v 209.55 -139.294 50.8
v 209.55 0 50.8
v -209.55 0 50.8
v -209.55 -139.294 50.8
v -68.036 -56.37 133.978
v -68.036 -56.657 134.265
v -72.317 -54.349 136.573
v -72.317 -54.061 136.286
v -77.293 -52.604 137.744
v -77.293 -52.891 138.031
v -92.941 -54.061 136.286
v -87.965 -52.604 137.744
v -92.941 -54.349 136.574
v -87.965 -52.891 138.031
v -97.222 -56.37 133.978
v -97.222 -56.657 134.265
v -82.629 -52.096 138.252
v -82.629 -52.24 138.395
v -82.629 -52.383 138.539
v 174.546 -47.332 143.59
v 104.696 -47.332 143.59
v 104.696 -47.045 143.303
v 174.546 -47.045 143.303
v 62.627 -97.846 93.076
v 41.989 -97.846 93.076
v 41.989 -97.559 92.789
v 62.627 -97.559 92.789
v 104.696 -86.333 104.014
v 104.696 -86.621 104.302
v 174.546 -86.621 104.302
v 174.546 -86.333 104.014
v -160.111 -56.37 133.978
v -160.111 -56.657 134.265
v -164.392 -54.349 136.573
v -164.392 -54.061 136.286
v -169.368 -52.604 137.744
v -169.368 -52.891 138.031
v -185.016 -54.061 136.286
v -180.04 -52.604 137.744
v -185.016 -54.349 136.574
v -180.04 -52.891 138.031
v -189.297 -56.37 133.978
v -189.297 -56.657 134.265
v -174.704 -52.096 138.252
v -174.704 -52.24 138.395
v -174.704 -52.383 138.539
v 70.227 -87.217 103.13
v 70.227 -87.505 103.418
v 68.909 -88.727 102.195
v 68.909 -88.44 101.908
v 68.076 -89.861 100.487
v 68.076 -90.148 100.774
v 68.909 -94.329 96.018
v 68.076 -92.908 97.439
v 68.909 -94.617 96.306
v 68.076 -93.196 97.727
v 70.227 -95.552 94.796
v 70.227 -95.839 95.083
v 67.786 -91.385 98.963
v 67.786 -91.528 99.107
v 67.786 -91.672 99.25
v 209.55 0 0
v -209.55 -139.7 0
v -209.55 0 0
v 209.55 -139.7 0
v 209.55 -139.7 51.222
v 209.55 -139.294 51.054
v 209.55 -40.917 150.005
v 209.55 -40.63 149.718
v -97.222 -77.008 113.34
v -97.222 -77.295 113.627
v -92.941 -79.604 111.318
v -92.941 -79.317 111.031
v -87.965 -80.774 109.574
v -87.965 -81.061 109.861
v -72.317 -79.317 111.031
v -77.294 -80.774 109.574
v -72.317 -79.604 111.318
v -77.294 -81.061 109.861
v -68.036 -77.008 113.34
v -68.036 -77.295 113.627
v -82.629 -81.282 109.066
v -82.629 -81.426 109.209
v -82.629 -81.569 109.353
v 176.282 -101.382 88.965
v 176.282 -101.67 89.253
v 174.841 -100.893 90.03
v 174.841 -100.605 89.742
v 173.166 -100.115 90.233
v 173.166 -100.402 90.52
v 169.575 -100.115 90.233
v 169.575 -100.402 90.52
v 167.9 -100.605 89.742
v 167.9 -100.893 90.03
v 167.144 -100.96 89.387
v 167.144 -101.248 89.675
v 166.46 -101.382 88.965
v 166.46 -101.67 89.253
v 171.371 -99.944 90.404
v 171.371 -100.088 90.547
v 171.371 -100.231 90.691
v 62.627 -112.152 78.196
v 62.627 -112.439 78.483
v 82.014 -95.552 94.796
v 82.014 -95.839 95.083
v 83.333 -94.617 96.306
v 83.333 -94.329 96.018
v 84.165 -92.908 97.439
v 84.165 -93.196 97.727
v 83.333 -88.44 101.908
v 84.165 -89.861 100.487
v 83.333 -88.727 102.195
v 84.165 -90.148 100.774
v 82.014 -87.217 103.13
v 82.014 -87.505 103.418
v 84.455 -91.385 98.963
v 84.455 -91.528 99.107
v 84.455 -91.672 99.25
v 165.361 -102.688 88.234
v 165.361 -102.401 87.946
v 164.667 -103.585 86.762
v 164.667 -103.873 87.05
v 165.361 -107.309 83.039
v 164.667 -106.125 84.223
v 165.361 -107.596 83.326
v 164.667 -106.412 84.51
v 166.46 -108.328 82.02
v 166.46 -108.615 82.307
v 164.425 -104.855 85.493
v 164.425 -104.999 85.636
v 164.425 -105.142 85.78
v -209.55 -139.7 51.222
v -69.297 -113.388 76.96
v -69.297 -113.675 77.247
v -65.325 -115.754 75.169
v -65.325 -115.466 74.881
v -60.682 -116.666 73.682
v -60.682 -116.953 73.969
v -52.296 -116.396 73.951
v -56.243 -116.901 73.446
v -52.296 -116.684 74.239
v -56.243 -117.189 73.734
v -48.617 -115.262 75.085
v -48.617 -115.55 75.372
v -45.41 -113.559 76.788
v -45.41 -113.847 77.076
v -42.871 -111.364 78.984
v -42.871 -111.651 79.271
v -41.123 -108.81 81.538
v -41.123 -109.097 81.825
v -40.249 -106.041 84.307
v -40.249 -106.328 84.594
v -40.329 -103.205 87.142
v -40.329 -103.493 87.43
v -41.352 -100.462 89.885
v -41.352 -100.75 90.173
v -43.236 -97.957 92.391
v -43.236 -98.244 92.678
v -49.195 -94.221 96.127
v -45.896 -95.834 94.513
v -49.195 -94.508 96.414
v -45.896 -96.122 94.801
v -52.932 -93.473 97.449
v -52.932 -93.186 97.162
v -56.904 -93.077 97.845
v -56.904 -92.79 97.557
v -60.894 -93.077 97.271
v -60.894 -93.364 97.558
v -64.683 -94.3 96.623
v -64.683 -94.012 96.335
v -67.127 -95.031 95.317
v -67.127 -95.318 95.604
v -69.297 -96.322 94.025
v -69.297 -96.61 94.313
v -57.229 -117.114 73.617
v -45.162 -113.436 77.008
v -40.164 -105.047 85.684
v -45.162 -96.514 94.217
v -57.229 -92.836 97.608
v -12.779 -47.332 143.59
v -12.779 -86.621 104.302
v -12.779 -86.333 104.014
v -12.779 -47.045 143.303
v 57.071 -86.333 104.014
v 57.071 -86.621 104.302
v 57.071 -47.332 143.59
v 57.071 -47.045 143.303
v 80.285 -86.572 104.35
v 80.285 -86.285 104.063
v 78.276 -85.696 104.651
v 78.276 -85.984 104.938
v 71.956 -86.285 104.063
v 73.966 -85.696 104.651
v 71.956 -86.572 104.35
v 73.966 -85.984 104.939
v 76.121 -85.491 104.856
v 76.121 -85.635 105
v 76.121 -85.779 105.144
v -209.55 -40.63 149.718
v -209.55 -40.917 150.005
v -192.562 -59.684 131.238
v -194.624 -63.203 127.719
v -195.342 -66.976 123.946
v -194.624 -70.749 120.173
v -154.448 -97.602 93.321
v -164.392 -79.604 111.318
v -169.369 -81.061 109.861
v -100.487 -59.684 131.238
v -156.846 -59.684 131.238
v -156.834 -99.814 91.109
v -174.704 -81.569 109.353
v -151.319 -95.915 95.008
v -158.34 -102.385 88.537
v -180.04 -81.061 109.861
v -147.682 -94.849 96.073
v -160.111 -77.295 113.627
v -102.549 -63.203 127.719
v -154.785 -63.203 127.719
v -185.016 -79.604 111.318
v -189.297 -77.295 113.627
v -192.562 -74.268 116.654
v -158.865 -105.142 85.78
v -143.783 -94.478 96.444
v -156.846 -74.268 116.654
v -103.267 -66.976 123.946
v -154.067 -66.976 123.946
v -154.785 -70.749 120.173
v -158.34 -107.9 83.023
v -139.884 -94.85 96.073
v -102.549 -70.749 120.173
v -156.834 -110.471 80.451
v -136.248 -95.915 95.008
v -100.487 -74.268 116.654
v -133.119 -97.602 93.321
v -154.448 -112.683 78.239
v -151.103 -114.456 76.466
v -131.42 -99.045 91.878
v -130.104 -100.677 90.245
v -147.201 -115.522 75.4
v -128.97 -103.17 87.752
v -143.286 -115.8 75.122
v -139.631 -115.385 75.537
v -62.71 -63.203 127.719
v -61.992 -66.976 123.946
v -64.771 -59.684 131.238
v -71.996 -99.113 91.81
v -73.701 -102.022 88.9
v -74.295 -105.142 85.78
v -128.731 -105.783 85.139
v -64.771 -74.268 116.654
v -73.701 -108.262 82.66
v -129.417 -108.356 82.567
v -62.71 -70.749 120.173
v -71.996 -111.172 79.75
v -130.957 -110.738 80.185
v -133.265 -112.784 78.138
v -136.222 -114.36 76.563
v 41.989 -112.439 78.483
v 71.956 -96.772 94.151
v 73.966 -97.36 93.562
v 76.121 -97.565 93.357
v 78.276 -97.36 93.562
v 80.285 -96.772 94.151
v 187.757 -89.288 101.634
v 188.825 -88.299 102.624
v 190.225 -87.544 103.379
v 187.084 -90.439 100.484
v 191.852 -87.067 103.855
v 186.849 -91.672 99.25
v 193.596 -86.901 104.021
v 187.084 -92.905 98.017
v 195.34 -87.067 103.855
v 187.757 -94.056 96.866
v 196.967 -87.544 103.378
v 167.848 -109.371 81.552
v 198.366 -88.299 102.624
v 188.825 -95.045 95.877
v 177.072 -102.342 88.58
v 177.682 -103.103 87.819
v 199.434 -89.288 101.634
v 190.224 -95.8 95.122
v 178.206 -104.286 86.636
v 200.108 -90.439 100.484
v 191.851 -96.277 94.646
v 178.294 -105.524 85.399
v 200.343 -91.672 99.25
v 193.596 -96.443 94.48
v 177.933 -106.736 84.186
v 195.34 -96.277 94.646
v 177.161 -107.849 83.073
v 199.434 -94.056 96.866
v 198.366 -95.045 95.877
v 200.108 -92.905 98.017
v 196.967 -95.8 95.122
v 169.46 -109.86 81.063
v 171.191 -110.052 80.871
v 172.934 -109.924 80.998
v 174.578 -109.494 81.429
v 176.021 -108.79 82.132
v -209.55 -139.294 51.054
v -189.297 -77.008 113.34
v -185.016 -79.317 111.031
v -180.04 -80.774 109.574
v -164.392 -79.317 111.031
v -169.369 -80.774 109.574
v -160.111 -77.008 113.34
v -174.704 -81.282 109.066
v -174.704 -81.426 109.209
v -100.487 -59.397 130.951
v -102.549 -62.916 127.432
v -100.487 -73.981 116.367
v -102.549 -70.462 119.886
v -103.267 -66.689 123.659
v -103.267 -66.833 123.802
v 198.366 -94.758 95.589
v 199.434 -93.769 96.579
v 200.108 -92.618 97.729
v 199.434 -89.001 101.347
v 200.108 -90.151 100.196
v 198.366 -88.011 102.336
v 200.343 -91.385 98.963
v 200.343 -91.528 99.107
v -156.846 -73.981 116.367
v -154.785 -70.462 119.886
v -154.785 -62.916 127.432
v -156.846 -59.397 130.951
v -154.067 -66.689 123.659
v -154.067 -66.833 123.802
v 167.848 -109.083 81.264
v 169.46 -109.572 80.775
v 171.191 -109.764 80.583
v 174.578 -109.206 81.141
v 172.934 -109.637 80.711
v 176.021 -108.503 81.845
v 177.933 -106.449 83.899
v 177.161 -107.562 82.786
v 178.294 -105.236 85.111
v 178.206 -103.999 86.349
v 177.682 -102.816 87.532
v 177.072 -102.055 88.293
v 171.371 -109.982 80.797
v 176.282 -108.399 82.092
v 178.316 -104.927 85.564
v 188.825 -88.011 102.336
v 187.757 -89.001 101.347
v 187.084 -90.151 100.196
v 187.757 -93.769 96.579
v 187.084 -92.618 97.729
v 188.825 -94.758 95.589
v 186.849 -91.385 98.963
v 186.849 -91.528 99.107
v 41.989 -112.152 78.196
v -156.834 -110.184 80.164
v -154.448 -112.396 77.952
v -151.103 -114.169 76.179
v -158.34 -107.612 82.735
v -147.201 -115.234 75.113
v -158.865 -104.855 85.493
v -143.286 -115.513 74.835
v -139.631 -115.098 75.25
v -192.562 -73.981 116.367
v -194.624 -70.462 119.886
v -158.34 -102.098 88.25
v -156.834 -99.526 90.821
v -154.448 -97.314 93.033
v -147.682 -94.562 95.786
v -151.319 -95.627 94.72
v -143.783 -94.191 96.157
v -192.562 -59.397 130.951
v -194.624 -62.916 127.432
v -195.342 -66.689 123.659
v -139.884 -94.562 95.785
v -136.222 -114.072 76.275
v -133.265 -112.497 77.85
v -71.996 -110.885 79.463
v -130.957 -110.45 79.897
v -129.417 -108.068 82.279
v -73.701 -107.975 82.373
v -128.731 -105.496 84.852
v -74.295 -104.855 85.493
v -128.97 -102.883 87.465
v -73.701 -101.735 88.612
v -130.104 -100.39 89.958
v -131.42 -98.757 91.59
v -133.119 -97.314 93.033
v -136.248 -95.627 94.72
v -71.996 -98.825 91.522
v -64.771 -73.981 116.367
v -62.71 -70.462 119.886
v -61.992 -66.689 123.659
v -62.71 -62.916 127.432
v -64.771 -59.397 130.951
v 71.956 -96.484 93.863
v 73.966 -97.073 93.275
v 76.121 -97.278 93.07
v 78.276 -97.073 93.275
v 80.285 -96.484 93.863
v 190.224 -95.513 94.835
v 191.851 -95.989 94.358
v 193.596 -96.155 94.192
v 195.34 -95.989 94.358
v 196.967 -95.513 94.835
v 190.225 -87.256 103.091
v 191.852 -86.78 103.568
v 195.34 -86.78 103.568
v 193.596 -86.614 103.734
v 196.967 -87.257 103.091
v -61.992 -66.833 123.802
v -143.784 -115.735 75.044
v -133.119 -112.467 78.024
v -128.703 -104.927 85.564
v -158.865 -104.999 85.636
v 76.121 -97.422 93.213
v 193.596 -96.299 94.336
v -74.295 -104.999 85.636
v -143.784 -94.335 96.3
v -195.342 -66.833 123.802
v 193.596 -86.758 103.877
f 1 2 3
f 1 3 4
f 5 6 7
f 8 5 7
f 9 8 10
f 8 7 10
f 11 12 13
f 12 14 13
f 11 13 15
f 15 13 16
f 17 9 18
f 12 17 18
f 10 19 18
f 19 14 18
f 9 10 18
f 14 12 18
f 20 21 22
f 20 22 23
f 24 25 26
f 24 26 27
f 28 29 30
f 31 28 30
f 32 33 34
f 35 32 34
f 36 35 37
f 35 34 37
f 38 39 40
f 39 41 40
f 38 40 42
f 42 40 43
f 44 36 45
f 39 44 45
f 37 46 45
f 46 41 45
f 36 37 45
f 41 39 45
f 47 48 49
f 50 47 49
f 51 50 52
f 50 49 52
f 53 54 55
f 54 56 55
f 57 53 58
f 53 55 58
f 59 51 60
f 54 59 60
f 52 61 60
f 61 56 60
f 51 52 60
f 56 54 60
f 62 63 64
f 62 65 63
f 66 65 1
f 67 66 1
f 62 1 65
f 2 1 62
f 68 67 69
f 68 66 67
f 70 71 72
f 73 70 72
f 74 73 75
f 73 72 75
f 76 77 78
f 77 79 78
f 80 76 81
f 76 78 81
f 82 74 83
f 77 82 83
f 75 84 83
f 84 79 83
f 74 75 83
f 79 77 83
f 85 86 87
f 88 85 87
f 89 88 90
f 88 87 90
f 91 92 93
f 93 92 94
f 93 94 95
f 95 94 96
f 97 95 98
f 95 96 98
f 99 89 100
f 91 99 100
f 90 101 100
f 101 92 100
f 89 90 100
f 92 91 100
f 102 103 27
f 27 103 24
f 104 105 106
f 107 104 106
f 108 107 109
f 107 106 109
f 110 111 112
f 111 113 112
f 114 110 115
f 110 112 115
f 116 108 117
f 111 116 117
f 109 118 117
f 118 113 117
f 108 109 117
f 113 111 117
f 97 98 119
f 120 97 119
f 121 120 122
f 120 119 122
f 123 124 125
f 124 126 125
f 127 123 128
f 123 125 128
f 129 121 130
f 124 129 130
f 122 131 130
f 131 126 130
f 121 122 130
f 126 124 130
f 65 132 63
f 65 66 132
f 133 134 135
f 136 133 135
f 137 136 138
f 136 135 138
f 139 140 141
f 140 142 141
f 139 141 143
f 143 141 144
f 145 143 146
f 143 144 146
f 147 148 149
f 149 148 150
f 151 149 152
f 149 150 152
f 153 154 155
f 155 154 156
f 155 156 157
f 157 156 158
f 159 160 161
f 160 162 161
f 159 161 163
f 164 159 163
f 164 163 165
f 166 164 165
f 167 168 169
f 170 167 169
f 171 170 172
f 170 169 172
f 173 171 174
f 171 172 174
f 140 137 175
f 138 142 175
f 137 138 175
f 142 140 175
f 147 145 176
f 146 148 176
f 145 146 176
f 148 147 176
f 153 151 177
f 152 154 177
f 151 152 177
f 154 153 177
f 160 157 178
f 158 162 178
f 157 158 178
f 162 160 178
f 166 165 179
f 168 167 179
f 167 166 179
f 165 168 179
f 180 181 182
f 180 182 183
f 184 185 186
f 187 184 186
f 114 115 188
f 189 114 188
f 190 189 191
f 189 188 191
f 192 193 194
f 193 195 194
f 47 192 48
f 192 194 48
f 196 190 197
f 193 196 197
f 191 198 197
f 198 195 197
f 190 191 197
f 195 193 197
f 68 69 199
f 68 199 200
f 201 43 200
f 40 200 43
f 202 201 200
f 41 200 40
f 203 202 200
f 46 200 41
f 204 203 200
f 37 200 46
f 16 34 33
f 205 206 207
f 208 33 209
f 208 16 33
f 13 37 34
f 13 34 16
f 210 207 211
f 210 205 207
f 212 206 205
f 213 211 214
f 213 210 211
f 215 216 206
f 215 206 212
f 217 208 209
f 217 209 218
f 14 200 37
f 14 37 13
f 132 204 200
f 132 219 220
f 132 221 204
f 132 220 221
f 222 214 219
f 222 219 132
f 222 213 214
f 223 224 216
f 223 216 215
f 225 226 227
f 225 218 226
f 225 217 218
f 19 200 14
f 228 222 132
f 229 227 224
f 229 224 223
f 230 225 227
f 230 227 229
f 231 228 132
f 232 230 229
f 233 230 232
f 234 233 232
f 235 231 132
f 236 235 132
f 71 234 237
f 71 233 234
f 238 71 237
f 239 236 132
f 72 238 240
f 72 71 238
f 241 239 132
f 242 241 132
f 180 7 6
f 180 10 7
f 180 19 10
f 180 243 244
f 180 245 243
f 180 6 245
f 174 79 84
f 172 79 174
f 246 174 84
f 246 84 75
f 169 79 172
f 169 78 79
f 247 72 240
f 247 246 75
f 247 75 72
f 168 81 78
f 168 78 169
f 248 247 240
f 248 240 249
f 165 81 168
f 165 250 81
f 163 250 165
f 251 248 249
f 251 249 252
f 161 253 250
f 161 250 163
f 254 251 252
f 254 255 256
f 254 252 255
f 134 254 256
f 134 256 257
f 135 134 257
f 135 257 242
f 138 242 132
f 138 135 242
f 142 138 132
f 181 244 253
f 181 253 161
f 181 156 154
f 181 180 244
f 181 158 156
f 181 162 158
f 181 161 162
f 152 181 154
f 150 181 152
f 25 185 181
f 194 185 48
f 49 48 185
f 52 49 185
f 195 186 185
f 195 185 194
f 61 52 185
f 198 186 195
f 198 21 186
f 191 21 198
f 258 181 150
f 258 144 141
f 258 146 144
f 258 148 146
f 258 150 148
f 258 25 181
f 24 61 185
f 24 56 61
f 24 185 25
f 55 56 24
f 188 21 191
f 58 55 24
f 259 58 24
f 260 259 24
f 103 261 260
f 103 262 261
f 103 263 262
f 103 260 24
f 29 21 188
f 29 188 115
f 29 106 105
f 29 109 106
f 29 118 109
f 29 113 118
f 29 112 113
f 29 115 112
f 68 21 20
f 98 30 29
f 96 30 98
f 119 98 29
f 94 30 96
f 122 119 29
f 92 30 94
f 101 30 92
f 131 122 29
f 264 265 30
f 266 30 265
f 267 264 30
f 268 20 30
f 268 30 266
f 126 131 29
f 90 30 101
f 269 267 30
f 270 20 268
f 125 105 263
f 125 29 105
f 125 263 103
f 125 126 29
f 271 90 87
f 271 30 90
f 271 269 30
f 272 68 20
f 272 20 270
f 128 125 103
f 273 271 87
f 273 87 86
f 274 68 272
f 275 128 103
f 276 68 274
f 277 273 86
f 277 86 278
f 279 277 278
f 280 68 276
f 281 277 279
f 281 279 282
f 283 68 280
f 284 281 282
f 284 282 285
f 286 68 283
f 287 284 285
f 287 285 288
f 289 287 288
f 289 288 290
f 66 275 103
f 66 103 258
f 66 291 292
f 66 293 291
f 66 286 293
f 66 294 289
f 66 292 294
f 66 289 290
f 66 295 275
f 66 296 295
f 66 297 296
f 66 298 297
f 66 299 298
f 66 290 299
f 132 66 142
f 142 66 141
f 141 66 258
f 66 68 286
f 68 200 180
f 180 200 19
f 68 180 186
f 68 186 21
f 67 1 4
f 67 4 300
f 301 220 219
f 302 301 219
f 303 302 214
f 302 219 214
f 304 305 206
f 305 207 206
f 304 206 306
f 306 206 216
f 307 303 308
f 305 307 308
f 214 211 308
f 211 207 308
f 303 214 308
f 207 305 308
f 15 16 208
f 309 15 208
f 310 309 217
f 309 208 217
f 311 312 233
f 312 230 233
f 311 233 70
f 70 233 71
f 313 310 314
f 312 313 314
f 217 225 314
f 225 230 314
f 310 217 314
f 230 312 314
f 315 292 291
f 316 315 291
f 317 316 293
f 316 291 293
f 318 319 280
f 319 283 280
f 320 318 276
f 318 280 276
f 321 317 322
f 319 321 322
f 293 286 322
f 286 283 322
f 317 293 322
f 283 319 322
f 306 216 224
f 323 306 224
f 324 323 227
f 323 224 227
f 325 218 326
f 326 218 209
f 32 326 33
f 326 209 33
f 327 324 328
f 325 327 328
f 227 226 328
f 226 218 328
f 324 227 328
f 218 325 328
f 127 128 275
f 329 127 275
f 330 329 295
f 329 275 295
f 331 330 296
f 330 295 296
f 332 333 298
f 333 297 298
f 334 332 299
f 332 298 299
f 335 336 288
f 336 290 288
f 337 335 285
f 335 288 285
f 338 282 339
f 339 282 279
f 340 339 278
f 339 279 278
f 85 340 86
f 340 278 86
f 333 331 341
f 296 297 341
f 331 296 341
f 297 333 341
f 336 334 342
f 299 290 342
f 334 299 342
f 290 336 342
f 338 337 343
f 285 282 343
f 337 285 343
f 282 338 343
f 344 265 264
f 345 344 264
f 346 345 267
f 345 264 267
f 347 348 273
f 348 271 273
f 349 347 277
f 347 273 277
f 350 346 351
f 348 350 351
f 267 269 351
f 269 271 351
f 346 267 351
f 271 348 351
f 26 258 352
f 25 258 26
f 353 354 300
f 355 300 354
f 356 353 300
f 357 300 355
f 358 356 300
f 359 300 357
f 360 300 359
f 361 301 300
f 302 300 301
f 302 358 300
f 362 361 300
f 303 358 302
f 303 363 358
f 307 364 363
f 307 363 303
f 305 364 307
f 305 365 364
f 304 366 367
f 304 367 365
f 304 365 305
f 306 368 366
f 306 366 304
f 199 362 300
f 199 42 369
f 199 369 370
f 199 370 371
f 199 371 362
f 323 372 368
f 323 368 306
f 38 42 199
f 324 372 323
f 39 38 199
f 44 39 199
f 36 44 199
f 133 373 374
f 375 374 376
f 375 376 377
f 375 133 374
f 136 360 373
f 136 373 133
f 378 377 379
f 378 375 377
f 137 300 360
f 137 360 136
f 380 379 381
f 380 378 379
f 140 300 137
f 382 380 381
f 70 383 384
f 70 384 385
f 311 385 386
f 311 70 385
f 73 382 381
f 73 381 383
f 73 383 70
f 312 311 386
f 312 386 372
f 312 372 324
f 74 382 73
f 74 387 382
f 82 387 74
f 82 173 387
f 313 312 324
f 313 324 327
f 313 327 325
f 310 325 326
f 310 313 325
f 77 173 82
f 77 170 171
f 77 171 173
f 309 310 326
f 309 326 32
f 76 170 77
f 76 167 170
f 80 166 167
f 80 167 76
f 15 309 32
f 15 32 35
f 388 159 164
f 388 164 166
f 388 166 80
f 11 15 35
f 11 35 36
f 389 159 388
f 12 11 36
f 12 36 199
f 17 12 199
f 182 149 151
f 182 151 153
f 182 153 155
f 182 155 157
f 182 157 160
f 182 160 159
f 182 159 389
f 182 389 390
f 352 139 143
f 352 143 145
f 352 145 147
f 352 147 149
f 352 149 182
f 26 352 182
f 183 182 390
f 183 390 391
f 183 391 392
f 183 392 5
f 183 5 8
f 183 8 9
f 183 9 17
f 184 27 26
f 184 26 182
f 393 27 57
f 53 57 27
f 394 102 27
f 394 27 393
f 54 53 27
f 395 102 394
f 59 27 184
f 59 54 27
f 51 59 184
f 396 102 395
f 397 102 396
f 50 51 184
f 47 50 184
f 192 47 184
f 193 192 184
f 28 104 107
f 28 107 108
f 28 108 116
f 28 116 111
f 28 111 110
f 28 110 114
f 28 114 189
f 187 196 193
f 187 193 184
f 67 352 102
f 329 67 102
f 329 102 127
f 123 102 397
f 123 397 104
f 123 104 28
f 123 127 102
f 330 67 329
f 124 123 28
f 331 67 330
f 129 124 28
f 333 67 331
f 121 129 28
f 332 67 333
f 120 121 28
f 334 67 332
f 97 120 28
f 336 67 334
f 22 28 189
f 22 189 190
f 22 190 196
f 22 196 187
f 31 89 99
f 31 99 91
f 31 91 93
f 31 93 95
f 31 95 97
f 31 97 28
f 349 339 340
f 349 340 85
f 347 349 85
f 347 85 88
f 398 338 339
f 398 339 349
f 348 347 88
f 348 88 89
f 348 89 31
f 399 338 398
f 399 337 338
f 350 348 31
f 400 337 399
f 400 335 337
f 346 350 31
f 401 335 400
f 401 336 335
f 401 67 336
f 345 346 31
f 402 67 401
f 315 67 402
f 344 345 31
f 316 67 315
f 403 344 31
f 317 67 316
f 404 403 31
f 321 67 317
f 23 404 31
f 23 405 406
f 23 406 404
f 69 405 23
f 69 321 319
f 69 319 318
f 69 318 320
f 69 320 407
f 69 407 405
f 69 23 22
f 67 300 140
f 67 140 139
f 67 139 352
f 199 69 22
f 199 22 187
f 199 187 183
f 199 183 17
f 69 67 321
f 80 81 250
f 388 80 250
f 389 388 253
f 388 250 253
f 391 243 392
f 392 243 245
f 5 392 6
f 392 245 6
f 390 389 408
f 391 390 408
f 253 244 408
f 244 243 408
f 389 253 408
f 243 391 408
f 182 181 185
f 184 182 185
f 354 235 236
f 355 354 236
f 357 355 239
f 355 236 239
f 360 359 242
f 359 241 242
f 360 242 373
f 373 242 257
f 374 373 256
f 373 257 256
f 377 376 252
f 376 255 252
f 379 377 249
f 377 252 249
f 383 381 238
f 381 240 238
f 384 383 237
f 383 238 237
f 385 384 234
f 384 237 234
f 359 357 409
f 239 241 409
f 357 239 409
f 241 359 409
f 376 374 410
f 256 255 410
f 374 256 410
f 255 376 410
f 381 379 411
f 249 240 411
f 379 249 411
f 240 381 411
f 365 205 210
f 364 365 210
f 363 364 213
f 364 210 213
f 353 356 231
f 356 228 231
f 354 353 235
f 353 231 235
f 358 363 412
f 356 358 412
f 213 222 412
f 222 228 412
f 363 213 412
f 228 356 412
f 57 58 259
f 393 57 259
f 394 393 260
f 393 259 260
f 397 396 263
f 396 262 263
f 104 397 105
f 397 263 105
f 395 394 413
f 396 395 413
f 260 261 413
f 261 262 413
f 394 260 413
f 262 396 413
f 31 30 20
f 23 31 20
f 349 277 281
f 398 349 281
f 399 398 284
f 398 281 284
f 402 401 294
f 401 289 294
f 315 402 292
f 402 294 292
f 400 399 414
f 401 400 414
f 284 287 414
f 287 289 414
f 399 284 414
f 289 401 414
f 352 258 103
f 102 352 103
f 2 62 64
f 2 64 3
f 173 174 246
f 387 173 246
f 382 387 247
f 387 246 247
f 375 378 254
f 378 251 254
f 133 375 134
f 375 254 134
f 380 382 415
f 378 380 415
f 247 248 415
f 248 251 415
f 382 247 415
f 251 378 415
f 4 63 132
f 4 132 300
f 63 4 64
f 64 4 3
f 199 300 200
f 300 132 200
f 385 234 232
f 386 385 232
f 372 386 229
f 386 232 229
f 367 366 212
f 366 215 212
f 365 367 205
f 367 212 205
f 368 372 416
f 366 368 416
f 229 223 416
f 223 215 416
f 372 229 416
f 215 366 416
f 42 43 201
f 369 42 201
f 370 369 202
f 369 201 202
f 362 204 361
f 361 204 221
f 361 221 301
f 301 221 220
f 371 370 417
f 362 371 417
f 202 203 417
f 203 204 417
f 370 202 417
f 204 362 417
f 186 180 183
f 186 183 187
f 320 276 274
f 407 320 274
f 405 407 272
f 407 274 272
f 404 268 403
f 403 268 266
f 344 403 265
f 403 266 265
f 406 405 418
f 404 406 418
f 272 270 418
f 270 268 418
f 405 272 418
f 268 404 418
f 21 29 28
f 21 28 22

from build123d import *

# Parameters (mm, degrees)
F1_DEPTH = 209.55
F2_W     = 20.6375
F2_H     = 20.6375
F2_W_2   = 69.85
F2_H_2   = 55.5625
F3_DEPTH = 0.4064


# Not quite as in the source:
# - the dataset's text gives a spline's control points without its knots; the knots are read off the source's solid


with BuildPart() as f1:
    # F0 (on Right) → F1 (new body, symmetric)
    with BuildSketch(Plane.YZ):
        Polygon((-139.7, 0), (0, 0), (0, 50.8), (-139.2936, 50.8), (-139.2936, 51.054), (-40.6298144724, 149.7177855276), (-40.9171826682, 150.0051537235), (-139.7, 51.2223363917), align=None)
    extrude(amount=F1_DEPTH, both=True)

    # F2 (on face) → F3 (cut, through all)
    with BuildSketch(Plane(origin=(0, -95.4611681959, 95.4611681959), x_dir=(1, 0, 0), z_dir=(0, -0.7071067812, 0.7071067812))):
        with Locations((52.3081513166, -13.6913588034)):
            Rectangle(F2_W, F2_H)
        with Locations((139.6206513166, 40.2836411966)):
            Rectangle(F2_W_2, F2_H_2)
        with Locations((22.1456513166, 40.2836411966)):
            Rectangle(F2_W_2, F2_H_2)
        with BuildLine():
            add(Edge.make_bspline(
                [(-69.2965076834, -25.7584924034), (-66.1370016834, -28.9176682034), (-61.6969800834, -30.7569838034), (-57.2293486834, -30.7569838034), (-52.7614378834, -30.7569838034), (-48.3210606834, -28.9176682034), (-45.1618848834, -25.7584924034), (-42.0027344834, -22.5993420034), (-40.1637236834, -18.1593204034), (-40.1637236834, -13.6913588034), (-40.1637236834, -9.2234226034), (-42.0027344834, -4.7833502034), (-45.1618848834, -1.6242252034), (-48.3210606834, 1.5349251966), (-52.7614378834, 3.3742661966), (-57.2293486834, 3.3742661966)],
                knots=[3, 3, 3, 3, 4, 4, 4, 5, 5, 5, 6, 6, 6, 7, 7, 7, 8, 8, 8, 8], degree=3))
            add(Edge.make_bspline(
                [(-57.2293486834, 3.3742661966), (-61.6969800834, 3.3742661966), (-66.1370016834, 1.5349251966), (-69.2965076834, -1.6242252034)],
                knots=[0, 0, 0, 0, 1, 1, 1, 1], degree=3))
            add(Edge.make_bspline(
                [(-69.2965076834, -1.6242252034), (-72.4556326834, -4.7833502034), (-74.2949736834, -9.2234226034), (-74.2949736834, -13.6913588034), (-74.2949736834, -18.1593204034), (-72.4556326834, -22.5993420034), (-69.2965076834, -25.7584924034)],
                knots=[1, 1, 1, 1, 2, 2, 2, 3, 3, 3, 3], degree=3))
        make_face()
        with BuildLine():
            add(Edge.make_bspline(
                [(82.0141371166, 11.2521523966), (80.4710871166, 12.7948975966), (78.3027399166, 13.6930161966), (76.1206513166, 13.6930161966)],
                knots=[7, 7, 7, 7, 8, 8, 8, 8], degree=3))
            add(Edge.make_bspline(
                [(76.1206513166, 13.6930161966), (73.9388421166, 13.6930161966), (71.7701901166, 12.7948975966), (70.2274449166, 11.2521523966)],
                knots=[0, 0, 0, 0, 1, 1, 1, 1], degree=3))
            add(Edge.make_bspline(
                [(70.2274449166, 11.2521523966), (68.6847505166, 9.7091023966), (67.7862763166, 7.5404503966), (67.7862763166, 5.3586411966), (67.7862763166, 3.1768573966), (68.6847505166, 1.0081545966), (70.2274449166, -0.5345398034)],
                knots=[1, 1, 1, 1, 2, 2, 2, 3, 3, 3, 3], degree=3))
            add(Edge.make_bspline(
                [(70.2274449166, -0.5345398034), (71.7701901166, -2.0775898034), (73.9388421166, -2.9757338034), (76.1206513166, -2.9757338034), (78.3027399166, -2.9757338034), (80.4710871166, -2.0775898034), (82.0141371166, -0.5345398034)],
                knots=[3, 3, 3, 3, 4, 4, 4, 5, 5, 5, 5], degree=3))
            add(Edge.make_bspline(
                [(82.0141371166, -0.5345398034), (83.5572379166, 1.0081545966), (84.4550263166, 3.1768573966), (84.4550263166, 5.3586411966), (84.4550263166, 7.5404503966), (83.5572379166, 9.7091023966), (82.0141371166, 11.2521523966)],
                knots=[5, 5, 5, 5, 6, 6, 6, 7, 7, 7, 7], degree=3))
        make_face()
        with BuildLine():
            add(Edge.make_bspline(
                [(-68.0362866834, 54.8767285966), (-71.8565482834, 58.6969901966), (-77.2264130834, 60.9211411966), (-82.6293486834, 60.9211411966)],
                knots=[7, 7, 7, 7, 8, 8, 8, 8], degree=3))
            add(Edge.make_bspline(
                [(-82.6293486834, 60.9211411966), (-88.0319794834, 60.9211411966), (-93.4014886834, 58.6969901966), (-97.2220804834, 54.8767285966)],
                knots=[0, 0, 0, 0, 1, 1, 1, 1], degree=3))
            add(Edge.make_bspline(
                [(-97.2220804834, 54.8767285966), (-101.0426976834, 51.0561113966), (-103.2668486834, 45.6865767966), (-103.2668486834, 40.2836411966), (-103.2668486834, 34.8807055966), (-101.0426976834, 29.5111455966), (-97.2220804834, 25.6905791966)],
                knots=[1, 1, 1, 1, 2, 2, 2, 3, 3, 3, 3], degree=3))
            add(Edge.make_bspline(
                [(-97.2220804834, 25.6905791966), (-93.4014886834, 21.8703175966), (-88.0319794834, 19.6461411966), (-82.6293486834, 19.6461411966), (-77.2264130834, 19.6461411966), (-71.8565482834, 21.8703175966), (-68.0362866834, 25.6905791966)],
                knots=[3, 3, 3, 3, 4, 4, 4, 5, 5, 5, 5], degree=3))
            add(Edge.make_bspline(
                [(-68.0362866834, 25.6905791966), (-64.2160250834, 29.5111455966), (-61.9918486834, 34.8807055966), (-61.9918486834, 40.2836411966), (-61.9918486834, 45.6865767966), (-64.2160250834, 51.0561113966), (-68.0362866834, 54.8767285966)],
                knots=[5, 5, 5, 5, 6, 6, 6, 7, 7, 7, 7], degree=3))
        make_face()
        with BuildLine():
            add(Edge.make_bspline(
                [(-160.1112866834, 54.8767285966), (-163.9315482834, 58.6969901966), (-169.3014130834, 60.9211411966), (-174.7043486834, 60.9211411966)],
                knots=[7, 7, 7, 7, 8, 8, 8, 8], degree=3))
            add(Edge.make_bspline(
                [(-174.7043486834, 60.9211411966), (-180.1069794834, 60.9211411966), (-185.4764886834, 58.6969901966), (-189.2970804834, 54.8767285966)],
                knots=[0, 0, 0, 0, 1, 1, 1, 1], degree=3))
            add(Edge.make_bspline(
                [(-189.2970804834, 54.8767285966), (-193.1176976834, 51.0561113966), (-195.3418486834, 45.6865767966), (-195.3418486834, 40.2836411966), (-195.3418486834, 34.8807055966), (-193.1176976834, 29.5111455966), (-189.2970804834, 25.6905791966)],
                knots=[1, 1, 1, 1, 2, 2, 2, 3, 3, 3, 3], degree=3))
            add(Edge.make_bspline(
                [(-189.2970804834, 25.6905791966), (-185.4764886834, 21.8703175966), (-180.1069794834, 19.6461411966), (-174.7043486834, 19.6461411966), (-169.3014130834, 19.6461411966), (-163.9315482834, 21.8703175966), (-160.1112866834, 25.6905791966)],
                knots=[3, 3, 3, 3, 4, 4, 4, 5, 5, 5, 5], degree=3))
            add(Edge.make_bspline(
                [(-160.1112866834, 25.6905791966), (-156.2910250834, 29.5111455966), (-154.0668486834, 34.8807055966), (-154.0668486834, 40.2836411966), (-154.0668486834, 45.6865767966), (-156.2910250834, 51.0561113966), (-160.1112866834, 54.8767285966)],
                knots=[5, 5, 5, 5, 6, 6, 6, 7, 7, 7, 7], degree=3))
        make_face()
        with BuildLine():
            add(Edge.make_bspline(
                [(-133.1194686834, -3.0270418034), (-135.9113858834, -0.2354802034), (-139.8353556834, 1.3898911966), (-143.7837856834, 1.3898911966)],
                knots=[7, 7, 7, 7, 8, 8, 8, 8], degree=3))
            add(Edge.make_bspline(
                [(-143.7837856834, 1.3898911966), (-147.7318600834, 1.3898911966), (-151.6558044834, -0.2354802034), (-154.4477216834, -3.0270418034)],
                knots=[0, 0, 0, 0, 1, 1, 1, 1], degree=3))
            add(Edge.make_bspline(
                [(-154.4477216834, -3.0270418034), (-157.2396388834, -5.8189844034), (-158.8650356834, -9.7429288034), (-158.8650356834, -13.6913588034), (-158.8650356834, -17.6397888034), (-157.2396388834, -21.5637332034), (-154.4477216834, -24.3552948034)],
                knots=[1, 1, 1, 1, 2, 2, 2, 3, 3, 3, 3], degree=3))
            add(Edge.make_bspline(
                [(-154.4477216834, -24.3552948034), (-151.6558044834, -27.1472120034), (-147.7318600834, -28.7726088034), (-143.7837856834, -28.7726088034), (-139.8353556834, -28.7726088034), (-135.9113858834, -27.1472120034), (-133.1194686834, -24.3552948034), (-130.3279070834, -21.5637332034), (-128.7025356834, -17.6397888034), (-128.7025356834, -13.6913588034), (-128.7025356834, -9.7429288034), (-130.3279070834, -5.8189844034), (-133.1194686834, -3.0270418034)],
                knots=[3, 3, 3, 3, 4, 4, 4, 5, 5, 5, 6, 6, 6, 7, 7, 7, 7], degree=3))
        make_face()
        with BuildLine():
            add(Edge.make_bspline(
                [(176.2819699166, -8.7803704034), (174.9962473166, -7.4946732034), (173.1889611166, -6.7460336034), (171.3706513166, -6.7460336034)],
                knots=[7, 7, 7, 7, 8, 8, 8, 8], degree=3))
            add(Edge.make_bspline(
                [(171.3706513166, -6.7460336034), (169.5523161166, -6.7460336034), (167.7453601166, -7.4946732034), (166.4596629166, -8.7803704034)],
                knots=[0, 0, 0, 0, 1, 1, 1, 1], degree=3))
            add(Edge.make_bspline(
                [(166.4596629166, -8.7803704034), (165.1739657166, -10.0660930034), (164.4253261166, -11.8730236034), (164.4253261166, -13.6913588034), (164.4253261166, -15.5096686034), (165.1739657166, -17.3166246034), (166.4596629166, -18.6023218034)],
                knots=[1, 1, 1, 1, 2, 2, 2, 3, 3, 3, 3], degree=3))
            add(Edge.make_bspline(
                [(166.4596629166, -18.6023218034), (167.7453601166, -19.8880444034), (169.5523161166, -20.6366586034), (171.3706513166, -20.6366586034), (173.1889611166, -20.6366586034), (174.9962473166, -19.8880444034), (176.2819699166, -18.6023218034), (177.5676671166, -17.3166246034), (178.3159511166, -15.5096686034), (178.3159511166, -13.6913588034), (178.3159511166, -11.8730236034), (177.5676671166, -10.0660930034), (176.2819699166, -8.7803704034)],
                knots=[3, 3, 3, 3, 4, 4, 4, 5, 5, 5, 6, 6, 6, 7, 7, 7, 7], degree=3))
        make_face()
        with BuildLine():
            add(Edge.make_bspline(
                [(198.3663809166, 10.1293961966), (197.1175645166, 11.3782633966), (195.3622721166, 12.1055161966), (193.5956513166, 12.1055161966)],
                knots=[7, 7, 7, 7, 8, 8, 8, 8], degree=3))
            add(Edge.make_bspline(
                [(193.5956513166, 12.1055161966), (191.8293607166, 12.1055161966), (190.0740683166, 11.3782633966), (188.8248709166, 10.1293961966)],
                knots=[0, 0, 0, 0, 1, 1, 1, 1], degree=3))
            add(Edge.make_bspline(
                [(188.8248709166, 10.1293961966), (187.5760037166, 8.8805797966), (186.8487763166, 7.1249317966), (186.8487763166, 5.3586411966), (186.8487763166, 3.5923251966), (187.5760037166, 1.8367279966), (188.8248709166, 0.5878607966)],
                knots=[1, 1, 1, 1, 2, 2, 2, 3, 3, 3, 3], degree=3))
            add(Edge.make_bspline(
                [(188.8248709166, 0.5878607966), (190.0740683166, -0.6609810034), (191.8293607166, -1.3882338034), (193.5956513166, -1.3882338034), (195.3622721166, -1.3882338034), (197.1175645166, -0.6609810034), (198.3663809166, 0.5878607966)],
                knots=[3, 3, 3, 3, 4, 4, 4, 5, 5, 5, 5], degree=3))
            add(Edge.make_bspline(
                [(198.3663809166, 0.5878607966), (199.6155783166, 1.8367279966), (200.3425263166, 3.5923251966), (200.3425263166, 5.3586411966), (200.3425263166, 7.1249317966), (199.6155783166, 8.8805797966), (198.3663809166, 10.1293961966)],
                knots=[5, 5, 5, 5, 6, 6, 6, 7, 7, 7, 7], degree=3))
        make_face()
    extrude(amount=-F3_DEPTH, mode=Mode.SUBTRACT)


solid = f1.part
